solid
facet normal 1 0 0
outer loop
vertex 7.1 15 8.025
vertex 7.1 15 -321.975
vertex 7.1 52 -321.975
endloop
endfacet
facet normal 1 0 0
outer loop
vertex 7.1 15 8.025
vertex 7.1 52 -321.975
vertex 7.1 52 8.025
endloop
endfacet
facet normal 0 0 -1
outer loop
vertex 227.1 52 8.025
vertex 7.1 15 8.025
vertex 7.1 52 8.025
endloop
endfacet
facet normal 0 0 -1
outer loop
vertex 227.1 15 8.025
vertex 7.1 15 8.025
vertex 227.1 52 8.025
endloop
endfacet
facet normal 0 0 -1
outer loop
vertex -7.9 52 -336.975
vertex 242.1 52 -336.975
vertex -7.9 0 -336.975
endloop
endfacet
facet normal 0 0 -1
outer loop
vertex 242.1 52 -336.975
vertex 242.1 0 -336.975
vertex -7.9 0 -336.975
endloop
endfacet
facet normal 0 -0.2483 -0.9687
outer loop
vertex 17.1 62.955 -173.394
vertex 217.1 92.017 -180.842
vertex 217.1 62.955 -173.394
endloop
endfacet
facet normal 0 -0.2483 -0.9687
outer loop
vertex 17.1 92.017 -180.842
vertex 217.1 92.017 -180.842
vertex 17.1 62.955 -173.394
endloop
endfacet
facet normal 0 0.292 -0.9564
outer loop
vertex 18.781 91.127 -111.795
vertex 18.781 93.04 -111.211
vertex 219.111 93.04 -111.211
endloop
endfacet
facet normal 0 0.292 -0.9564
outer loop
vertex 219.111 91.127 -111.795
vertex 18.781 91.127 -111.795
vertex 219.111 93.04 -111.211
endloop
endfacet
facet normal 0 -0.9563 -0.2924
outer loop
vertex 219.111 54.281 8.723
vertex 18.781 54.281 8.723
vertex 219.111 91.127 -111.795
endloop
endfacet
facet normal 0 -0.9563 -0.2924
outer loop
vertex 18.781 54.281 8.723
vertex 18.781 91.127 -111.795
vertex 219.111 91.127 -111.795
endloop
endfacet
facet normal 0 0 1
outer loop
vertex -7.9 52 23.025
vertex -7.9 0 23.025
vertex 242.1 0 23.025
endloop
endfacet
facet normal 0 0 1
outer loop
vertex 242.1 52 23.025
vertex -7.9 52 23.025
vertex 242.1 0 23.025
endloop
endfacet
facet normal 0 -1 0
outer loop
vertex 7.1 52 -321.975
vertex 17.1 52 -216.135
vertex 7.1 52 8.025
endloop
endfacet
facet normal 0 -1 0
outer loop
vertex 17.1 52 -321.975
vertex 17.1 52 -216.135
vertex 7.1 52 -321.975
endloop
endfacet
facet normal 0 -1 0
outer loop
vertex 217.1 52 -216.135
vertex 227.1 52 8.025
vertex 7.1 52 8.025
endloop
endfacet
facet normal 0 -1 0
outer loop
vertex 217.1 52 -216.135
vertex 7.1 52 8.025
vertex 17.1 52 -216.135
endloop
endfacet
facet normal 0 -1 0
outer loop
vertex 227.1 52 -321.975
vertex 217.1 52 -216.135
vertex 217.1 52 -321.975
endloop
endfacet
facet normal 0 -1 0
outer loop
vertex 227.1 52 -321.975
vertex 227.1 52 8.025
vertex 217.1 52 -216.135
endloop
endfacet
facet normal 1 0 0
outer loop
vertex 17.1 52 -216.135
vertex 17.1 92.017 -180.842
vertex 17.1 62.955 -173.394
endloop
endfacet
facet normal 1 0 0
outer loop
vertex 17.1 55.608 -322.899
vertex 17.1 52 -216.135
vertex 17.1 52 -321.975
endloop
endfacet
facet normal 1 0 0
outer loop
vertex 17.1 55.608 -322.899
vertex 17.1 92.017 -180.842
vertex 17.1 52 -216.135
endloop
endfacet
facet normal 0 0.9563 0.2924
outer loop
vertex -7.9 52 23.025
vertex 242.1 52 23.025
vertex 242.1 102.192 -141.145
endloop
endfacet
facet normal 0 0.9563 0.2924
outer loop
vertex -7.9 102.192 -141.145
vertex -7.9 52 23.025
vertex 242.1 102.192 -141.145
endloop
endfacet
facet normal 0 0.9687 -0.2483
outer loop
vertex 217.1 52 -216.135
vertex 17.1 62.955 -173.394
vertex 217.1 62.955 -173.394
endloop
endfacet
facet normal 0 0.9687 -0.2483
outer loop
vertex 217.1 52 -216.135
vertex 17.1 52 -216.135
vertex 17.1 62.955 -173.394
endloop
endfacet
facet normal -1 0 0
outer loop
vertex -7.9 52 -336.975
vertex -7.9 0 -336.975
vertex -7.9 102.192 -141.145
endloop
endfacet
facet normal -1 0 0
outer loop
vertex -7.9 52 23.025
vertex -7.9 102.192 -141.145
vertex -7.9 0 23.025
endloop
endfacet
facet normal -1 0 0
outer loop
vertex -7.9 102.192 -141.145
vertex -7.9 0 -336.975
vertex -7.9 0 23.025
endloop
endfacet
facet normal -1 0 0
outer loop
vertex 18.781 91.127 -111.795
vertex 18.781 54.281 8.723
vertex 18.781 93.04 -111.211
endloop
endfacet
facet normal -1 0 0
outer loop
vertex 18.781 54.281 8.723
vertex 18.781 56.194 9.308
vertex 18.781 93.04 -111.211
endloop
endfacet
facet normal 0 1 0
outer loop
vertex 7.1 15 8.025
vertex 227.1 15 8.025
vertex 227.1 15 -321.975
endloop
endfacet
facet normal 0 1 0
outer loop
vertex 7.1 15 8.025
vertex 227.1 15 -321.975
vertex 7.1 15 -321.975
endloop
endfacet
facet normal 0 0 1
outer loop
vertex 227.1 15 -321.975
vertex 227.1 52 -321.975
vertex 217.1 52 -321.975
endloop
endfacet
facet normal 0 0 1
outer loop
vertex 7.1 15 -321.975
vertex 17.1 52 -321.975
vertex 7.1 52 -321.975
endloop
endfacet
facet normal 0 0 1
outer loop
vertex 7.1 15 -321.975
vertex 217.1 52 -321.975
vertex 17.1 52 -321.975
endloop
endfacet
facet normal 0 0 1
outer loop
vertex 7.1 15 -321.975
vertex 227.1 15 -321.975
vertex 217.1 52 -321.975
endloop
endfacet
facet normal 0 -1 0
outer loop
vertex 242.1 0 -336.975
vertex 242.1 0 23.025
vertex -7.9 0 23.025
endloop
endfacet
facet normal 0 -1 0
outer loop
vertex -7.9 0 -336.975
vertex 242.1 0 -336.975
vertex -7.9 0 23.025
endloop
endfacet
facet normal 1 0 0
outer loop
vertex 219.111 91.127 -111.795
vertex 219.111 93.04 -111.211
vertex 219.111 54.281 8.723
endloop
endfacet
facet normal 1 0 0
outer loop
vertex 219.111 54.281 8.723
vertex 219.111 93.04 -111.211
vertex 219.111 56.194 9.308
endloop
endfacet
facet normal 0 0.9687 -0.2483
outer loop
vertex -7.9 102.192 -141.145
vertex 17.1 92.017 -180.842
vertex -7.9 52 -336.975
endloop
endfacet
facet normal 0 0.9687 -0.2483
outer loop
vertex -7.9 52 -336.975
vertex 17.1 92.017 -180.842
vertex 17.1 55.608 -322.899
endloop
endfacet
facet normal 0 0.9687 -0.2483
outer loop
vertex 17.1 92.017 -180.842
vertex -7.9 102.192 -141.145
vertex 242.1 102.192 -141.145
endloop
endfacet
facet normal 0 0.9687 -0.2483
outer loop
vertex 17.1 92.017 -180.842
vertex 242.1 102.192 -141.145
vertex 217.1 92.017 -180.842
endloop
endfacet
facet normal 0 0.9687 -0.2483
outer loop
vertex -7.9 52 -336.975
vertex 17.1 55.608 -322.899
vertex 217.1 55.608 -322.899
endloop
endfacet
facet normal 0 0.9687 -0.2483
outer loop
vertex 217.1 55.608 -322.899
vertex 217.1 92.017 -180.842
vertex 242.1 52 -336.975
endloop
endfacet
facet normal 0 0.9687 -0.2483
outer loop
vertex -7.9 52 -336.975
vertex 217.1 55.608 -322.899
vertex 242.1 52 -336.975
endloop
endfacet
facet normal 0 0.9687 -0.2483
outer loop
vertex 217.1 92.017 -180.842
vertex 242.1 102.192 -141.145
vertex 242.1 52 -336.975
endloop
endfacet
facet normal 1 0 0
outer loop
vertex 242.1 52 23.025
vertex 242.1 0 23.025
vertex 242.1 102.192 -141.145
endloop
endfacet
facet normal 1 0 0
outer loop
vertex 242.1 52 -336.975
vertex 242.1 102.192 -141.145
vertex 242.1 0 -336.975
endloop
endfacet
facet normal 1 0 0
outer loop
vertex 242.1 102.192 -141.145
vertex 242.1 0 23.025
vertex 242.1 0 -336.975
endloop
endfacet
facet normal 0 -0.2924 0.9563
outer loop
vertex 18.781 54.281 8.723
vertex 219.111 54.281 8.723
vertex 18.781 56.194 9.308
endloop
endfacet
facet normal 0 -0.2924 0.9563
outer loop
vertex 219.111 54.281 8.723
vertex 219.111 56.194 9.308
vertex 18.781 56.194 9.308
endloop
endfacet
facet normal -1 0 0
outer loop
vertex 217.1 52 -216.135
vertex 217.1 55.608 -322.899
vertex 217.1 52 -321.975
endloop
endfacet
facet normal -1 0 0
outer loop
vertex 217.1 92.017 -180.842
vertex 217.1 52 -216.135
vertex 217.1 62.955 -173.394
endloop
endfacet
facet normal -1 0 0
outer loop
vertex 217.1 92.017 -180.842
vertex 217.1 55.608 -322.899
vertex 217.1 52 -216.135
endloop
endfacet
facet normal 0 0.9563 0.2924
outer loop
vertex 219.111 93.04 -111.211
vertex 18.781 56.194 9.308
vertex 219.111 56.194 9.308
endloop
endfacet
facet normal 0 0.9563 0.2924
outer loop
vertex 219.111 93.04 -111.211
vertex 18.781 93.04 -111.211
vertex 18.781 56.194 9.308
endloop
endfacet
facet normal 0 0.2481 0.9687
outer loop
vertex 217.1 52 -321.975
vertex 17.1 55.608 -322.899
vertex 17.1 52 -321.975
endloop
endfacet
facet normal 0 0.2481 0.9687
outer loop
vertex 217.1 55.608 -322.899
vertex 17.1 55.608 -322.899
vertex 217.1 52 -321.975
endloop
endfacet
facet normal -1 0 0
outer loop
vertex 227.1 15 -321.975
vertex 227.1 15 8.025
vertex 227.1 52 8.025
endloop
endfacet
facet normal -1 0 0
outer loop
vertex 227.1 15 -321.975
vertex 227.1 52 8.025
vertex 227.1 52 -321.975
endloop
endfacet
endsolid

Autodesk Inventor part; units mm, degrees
ref_plane "YZ Plane" through (0, 0, 0) normal (1, 0, 0) x (0, 1, 0)
ref_plane "XZ Plane" through (0, 0, 0) normal (0, 1, 0) x (-1, 0, 0)
ref_plane "XY Plane" through (0, 0, 0) normal (0, 0, 1) x (1, 0, 0)
sketch "Sketch1" plane through (0, 0, 0) normal (0, 1, 0) x (-1, 0, 0)
  line L0 (7.9003, 23.0254) -> (-242.0997, 23.0254)
  line L1 (-242.0997, 23.0254) -> (-242.0997, -336.9746)
  line L2 (-242.0997, -336.9746) -> (7.9003, -336.9746)
  line L3 (7.9003, -336.9746) -> (7.9003, 23.0254)
  point P0 (0, 0)
  dimension "d0" = 250
  dimension "d1" = 360
extrude "Extrusion1" add sketch "Sketch1" along normal blind 52
shell "Shell1" thickness 15 removed faces 1 at (158.7664, 52, -96.9746)
sketch3d "3D Sketch5"
sketch "Sketch8" plane through (242.0997, 0, 23.0254) normal (1, 0, 0) x (0, 0, -1)
  line L0 (0, 52) -> (164.1703, 102.1919)
  line L1 (0, 52) -> (171.6715, 52) construction
  line L2 (0, 52) -> (360, 52) projected
  line L3 (164.1703, 102.1919) -> (360, 52)
  line L4 (360, 52) -> (0, 52)
  point P0 (23.0254, 0)
  dimension "d27" = 17
extrude "Extrusion4" add sketch "Sketch8" against normal up to surface (250 mm away)
sketch "Sketch9" plane through (-7.9003, 102.1919, -141.1449) normal (0, 0.9686887, -0.2482786) x (1, 0, 0)
  line L0 (15, 187.6292) -> (235, 187.6292) projected
  line L1 (225, 40.9807) -> (25, 40.9807)
  line L2 (25, 40.9807) -> (25, 187.6292)
  line L3 (25, 187.6292) -> (225, 187.6292)
  line L4 (225, 187.6292) -> (225, 40.9807)
  line L5 (250, 202.1596) -> (250, 0) projected
  line L6 (0, 202.1596) -> (0, 0) projected
  point P0 (7.9003, -111.3534)
  point P1 (225, 187.6292)
  dimension "d30" = 25
  dimension "d31" = 25
extrude "Extrusion5" cut sketch "Sketch9" against normal blind 30
sketch "Sketch10" plane through (242.0997, 0, -336.9746) normal (0, 0, -1) x (-1, 0, 0)
  line L0 (225, 52) -> (25, 52) projected
  line L1 (0, 0) -> (250, 0) projected
  line L2 (25, 52) -> (226.6576, 52)
  line L3 (226.6576, 52) -> (226.6576, 0)
  line L4 (226.6576, 0) -> (25, 0)
  line L5 (25, 0) -> (25, 52)
  point P0 (242.0997, 0)
sketch "Sketch11" plane through (-7.9003, 0, 23.0254) normal (0, 0, 1) x (1, 0, 0)
  line L0 (15, 15) -> (15, 52) projected
  line L1 (15, 28.3801) -> (237.0279, 28.3801)
  line L2 (237.0279, 28.3801) -> (237.0279, 6.6777)
  line L3 (237.0279, 6.6777) -> (15, 6.6777)
  line L4 (15, 6.6777) -> (15, 28.3801)
  point P0 (7.9003, 0)
sketch "Sketch12" plane through (-7.9003, 52, 23.0254) normal (0, 0.9563048, 0.2923717) x (1, 0, 0)
  line L0 (235, 14.3446) -> (15, 14.3446) projected
  line L1 (26.6812, 140.3694) -> (227.0114, 140.3694)
  line L2 (227.0114, 140.3694) -> (227.0114, 14.3446)
  line L3 (227.0114, 14.3446) -> (26.6812, 14.3446)
  line L4 (26.6812, 14.3446) -> (26.6812, 140.3694)
  point P0 (7.9003, 6.8159)
extrude "Extrusion6" add sketch "Sketch12" against normal blind 2 separate body
properties part number "Part1proj" material "Wood (Birch)"
